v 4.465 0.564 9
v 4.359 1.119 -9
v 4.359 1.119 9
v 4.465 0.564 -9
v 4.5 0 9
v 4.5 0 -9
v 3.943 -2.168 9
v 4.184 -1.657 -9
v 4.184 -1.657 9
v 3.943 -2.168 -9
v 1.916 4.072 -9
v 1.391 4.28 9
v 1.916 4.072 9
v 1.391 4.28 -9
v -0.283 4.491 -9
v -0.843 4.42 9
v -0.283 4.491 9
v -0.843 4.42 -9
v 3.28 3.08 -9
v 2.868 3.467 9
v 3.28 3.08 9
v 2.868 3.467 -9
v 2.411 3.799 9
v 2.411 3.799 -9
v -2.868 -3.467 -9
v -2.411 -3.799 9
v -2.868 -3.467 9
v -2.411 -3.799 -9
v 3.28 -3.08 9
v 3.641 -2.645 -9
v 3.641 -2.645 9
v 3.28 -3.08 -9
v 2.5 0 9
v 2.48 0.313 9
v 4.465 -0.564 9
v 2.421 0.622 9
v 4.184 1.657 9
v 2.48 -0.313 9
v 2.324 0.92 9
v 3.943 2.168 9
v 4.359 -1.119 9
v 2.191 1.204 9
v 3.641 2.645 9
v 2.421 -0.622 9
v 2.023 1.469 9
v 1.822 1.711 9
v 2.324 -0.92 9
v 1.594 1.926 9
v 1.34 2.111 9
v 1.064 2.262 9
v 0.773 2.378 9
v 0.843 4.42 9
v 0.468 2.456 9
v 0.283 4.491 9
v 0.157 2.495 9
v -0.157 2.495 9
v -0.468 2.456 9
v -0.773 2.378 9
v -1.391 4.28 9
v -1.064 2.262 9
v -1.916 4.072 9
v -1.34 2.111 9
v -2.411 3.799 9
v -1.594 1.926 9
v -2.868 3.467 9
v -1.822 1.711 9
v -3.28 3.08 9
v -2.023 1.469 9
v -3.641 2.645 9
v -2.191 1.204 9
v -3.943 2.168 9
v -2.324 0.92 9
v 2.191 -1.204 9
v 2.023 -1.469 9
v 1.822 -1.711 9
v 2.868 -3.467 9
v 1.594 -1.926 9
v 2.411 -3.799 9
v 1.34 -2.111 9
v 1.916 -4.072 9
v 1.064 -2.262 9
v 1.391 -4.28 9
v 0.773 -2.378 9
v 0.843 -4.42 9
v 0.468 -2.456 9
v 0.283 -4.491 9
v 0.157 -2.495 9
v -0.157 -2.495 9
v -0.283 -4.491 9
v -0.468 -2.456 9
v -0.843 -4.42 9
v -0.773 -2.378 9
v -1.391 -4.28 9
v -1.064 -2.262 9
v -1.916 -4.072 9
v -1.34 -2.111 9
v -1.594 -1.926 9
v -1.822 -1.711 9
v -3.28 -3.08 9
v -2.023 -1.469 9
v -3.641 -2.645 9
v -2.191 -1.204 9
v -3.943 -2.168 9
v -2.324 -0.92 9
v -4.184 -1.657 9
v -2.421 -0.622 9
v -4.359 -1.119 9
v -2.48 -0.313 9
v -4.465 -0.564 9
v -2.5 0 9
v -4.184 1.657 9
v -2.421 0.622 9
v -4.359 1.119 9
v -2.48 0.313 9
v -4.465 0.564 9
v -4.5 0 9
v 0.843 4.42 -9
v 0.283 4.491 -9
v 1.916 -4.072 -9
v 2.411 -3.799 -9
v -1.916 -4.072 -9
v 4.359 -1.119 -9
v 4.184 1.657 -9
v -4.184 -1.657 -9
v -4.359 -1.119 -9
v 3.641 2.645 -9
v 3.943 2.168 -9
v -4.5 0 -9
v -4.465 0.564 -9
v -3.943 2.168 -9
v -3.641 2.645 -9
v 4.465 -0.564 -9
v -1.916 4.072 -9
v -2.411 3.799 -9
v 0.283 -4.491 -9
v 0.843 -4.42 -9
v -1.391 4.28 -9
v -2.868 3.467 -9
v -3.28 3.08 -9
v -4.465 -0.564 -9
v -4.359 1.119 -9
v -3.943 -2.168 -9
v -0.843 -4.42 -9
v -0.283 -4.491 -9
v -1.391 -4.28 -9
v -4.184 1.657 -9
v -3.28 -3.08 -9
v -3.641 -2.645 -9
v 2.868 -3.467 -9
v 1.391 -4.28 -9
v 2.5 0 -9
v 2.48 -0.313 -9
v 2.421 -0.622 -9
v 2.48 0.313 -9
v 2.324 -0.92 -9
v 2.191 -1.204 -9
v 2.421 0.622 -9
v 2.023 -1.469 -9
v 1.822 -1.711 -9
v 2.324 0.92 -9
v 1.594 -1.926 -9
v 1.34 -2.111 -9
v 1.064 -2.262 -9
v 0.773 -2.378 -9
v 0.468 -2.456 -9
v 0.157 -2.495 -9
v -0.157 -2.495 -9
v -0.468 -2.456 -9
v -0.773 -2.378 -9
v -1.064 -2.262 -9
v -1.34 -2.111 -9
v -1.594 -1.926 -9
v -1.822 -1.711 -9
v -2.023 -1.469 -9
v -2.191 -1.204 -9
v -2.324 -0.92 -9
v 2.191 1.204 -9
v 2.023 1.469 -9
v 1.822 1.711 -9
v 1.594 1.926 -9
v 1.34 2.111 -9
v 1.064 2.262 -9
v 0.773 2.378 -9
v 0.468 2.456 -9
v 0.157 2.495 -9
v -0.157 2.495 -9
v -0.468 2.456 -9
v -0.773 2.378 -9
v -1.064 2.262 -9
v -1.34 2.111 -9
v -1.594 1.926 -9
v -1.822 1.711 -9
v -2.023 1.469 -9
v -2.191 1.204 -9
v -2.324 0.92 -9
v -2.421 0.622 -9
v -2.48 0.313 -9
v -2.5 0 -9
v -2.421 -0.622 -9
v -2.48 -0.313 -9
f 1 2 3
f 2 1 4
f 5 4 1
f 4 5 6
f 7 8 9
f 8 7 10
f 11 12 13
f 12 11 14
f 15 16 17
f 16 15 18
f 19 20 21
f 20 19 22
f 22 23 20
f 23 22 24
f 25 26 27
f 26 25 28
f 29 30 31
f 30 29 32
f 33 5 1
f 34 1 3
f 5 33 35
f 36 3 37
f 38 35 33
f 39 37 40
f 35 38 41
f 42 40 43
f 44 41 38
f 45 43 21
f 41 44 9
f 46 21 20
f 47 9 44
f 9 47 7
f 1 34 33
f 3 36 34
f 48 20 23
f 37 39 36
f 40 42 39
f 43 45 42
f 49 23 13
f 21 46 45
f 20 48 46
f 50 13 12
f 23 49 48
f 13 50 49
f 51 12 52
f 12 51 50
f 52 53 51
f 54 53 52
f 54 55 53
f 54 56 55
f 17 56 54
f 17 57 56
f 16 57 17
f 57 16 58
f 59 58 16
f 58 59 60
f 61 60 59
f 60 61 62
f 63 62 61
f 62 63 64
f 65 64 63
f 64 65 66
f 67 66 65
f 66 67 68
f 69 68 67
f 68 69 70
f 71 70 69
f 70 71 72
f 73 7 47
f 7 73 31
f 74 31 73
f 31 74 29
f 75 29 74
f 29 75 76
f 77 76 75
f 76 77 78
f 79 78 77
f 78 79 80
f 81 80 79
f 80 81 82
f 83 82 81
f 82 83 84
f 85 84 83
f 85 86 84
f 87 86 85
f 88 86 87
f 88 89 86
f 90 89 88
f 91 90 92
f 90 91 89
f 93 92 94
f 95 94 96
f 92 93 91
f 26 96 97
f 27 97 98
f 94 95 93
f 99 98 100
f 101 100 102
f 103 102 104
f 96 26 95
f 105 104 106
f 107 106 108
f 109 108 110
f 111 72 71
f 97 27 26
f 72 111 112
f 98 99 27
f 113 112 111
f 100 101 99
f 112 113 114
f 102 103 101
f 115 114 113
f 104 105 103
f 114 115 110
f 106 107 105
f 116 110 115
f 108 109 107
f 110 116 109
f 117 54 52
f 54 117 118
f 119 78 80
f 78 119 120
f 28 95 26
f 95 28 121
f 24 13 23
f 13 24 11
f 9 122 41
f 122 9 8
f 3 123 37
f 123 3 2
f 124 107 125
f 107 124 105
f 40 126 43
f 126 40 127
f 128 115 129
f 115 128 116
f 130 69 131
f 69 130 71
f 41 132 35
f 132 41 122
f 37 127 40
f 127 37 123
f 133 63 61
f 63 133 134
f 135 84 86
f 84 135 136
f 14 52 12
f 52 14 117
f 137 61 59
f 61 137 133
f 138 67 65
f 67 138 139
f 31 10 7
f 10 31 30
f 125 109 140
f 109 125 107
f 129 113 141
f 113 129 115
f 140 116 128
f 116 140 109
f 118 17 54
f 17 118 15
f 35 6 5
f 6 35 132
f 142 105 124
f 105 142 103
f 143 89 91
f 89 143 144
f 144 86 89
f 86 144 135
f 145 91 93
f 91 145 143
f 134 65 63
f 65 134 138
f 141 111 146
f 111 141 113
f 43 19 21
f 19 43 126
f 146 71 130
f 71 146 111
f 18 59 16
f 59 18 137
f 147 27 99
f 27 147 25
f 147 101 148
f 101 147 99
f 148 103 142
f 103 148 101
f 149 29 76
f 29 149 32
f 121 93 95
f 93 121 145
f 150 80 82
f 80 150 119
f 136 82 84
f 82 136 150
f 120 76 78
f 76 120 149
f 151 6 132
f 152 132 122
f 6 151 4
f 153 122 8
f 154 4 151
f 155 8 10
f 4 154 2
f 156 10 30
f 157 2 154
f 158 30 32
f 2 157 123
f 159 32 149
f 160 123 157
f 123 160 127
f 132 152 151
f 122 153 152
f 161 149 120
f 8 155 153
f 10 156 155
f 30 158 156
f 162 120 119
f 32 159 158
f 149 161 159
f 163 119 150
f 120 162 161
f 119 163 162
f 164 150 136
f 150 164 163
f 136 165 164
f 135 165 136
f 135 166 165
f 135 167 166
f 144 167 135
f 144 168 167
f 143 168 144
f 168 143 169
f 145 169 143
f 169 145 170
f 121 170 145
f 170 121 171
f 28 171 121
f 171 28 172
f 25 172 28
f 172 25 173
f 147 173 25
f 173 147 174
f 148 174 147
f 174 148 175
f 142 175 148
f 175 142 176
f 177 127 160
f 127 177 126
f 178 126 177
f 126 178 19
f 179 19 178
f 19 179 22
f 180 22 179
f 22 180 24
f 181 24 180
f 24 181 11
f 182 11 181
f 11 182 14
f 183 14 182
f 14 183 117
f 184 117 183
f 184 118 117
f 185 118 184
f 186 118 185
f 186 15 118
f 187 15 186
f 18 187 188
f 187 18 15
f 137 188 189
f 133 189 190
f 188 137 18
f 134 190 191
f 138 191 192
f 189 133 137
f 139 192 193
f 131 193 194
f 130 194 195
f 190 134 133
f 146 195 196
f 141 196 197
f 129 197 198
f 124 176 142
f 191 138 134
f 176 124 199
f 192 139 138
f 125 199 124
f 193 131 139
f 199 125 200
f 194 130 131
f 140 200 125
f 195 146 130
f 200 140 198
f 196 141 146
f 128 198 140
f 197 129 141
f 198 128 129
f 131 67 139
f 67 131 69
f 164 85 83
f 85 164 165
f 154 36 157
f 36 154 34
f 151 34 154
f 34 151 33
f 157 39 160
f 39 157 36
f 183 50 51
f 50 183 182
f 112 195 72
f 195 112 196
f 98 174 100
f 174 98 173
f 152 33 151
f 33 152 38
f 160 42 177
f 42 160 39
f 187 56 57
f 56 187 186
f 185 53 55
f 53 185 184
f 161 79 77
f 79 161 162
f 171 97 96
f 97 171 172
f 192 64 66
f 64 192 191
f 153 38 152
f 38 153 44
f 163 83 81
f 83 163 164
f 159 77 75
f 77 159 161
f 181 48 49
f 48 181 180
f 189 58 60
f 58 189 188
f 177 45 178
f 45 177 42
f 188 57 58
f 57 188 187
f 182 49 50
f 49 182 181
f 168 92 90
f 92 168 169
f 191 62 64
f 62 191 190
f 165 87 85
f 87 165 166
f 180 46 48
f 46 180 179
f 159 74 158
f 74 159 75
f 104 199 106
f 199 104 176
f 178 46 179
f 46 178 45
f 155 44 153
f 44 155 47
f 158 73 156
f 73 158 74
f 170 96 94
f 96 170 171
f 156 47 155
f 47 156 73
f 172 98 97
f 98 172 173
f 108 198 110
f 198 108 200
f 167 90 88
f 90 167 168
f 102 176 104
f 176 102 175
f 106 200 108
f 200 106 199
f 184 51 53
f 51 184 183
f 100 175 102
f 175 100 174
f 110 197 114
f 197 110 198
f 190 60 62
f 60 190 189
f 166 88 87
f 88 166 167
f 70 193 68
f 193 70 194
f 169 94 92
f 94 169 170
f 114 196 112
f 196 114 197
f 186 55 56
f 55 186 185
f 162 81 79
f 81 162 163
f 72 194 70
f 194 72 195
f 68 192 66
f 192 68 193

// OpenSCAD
$fn = 50;


difference() {
	union() {
		translate(v = [0, 0, -9.0000000000]) {
			cylinder(h = 18, r = 4.5000000000);
		}
	}
	union() {
		translate(v = [0, 0, -100.0000000000]) {
			cylinder(h = 200, r = 2.5000000000);
		}
	}
}
